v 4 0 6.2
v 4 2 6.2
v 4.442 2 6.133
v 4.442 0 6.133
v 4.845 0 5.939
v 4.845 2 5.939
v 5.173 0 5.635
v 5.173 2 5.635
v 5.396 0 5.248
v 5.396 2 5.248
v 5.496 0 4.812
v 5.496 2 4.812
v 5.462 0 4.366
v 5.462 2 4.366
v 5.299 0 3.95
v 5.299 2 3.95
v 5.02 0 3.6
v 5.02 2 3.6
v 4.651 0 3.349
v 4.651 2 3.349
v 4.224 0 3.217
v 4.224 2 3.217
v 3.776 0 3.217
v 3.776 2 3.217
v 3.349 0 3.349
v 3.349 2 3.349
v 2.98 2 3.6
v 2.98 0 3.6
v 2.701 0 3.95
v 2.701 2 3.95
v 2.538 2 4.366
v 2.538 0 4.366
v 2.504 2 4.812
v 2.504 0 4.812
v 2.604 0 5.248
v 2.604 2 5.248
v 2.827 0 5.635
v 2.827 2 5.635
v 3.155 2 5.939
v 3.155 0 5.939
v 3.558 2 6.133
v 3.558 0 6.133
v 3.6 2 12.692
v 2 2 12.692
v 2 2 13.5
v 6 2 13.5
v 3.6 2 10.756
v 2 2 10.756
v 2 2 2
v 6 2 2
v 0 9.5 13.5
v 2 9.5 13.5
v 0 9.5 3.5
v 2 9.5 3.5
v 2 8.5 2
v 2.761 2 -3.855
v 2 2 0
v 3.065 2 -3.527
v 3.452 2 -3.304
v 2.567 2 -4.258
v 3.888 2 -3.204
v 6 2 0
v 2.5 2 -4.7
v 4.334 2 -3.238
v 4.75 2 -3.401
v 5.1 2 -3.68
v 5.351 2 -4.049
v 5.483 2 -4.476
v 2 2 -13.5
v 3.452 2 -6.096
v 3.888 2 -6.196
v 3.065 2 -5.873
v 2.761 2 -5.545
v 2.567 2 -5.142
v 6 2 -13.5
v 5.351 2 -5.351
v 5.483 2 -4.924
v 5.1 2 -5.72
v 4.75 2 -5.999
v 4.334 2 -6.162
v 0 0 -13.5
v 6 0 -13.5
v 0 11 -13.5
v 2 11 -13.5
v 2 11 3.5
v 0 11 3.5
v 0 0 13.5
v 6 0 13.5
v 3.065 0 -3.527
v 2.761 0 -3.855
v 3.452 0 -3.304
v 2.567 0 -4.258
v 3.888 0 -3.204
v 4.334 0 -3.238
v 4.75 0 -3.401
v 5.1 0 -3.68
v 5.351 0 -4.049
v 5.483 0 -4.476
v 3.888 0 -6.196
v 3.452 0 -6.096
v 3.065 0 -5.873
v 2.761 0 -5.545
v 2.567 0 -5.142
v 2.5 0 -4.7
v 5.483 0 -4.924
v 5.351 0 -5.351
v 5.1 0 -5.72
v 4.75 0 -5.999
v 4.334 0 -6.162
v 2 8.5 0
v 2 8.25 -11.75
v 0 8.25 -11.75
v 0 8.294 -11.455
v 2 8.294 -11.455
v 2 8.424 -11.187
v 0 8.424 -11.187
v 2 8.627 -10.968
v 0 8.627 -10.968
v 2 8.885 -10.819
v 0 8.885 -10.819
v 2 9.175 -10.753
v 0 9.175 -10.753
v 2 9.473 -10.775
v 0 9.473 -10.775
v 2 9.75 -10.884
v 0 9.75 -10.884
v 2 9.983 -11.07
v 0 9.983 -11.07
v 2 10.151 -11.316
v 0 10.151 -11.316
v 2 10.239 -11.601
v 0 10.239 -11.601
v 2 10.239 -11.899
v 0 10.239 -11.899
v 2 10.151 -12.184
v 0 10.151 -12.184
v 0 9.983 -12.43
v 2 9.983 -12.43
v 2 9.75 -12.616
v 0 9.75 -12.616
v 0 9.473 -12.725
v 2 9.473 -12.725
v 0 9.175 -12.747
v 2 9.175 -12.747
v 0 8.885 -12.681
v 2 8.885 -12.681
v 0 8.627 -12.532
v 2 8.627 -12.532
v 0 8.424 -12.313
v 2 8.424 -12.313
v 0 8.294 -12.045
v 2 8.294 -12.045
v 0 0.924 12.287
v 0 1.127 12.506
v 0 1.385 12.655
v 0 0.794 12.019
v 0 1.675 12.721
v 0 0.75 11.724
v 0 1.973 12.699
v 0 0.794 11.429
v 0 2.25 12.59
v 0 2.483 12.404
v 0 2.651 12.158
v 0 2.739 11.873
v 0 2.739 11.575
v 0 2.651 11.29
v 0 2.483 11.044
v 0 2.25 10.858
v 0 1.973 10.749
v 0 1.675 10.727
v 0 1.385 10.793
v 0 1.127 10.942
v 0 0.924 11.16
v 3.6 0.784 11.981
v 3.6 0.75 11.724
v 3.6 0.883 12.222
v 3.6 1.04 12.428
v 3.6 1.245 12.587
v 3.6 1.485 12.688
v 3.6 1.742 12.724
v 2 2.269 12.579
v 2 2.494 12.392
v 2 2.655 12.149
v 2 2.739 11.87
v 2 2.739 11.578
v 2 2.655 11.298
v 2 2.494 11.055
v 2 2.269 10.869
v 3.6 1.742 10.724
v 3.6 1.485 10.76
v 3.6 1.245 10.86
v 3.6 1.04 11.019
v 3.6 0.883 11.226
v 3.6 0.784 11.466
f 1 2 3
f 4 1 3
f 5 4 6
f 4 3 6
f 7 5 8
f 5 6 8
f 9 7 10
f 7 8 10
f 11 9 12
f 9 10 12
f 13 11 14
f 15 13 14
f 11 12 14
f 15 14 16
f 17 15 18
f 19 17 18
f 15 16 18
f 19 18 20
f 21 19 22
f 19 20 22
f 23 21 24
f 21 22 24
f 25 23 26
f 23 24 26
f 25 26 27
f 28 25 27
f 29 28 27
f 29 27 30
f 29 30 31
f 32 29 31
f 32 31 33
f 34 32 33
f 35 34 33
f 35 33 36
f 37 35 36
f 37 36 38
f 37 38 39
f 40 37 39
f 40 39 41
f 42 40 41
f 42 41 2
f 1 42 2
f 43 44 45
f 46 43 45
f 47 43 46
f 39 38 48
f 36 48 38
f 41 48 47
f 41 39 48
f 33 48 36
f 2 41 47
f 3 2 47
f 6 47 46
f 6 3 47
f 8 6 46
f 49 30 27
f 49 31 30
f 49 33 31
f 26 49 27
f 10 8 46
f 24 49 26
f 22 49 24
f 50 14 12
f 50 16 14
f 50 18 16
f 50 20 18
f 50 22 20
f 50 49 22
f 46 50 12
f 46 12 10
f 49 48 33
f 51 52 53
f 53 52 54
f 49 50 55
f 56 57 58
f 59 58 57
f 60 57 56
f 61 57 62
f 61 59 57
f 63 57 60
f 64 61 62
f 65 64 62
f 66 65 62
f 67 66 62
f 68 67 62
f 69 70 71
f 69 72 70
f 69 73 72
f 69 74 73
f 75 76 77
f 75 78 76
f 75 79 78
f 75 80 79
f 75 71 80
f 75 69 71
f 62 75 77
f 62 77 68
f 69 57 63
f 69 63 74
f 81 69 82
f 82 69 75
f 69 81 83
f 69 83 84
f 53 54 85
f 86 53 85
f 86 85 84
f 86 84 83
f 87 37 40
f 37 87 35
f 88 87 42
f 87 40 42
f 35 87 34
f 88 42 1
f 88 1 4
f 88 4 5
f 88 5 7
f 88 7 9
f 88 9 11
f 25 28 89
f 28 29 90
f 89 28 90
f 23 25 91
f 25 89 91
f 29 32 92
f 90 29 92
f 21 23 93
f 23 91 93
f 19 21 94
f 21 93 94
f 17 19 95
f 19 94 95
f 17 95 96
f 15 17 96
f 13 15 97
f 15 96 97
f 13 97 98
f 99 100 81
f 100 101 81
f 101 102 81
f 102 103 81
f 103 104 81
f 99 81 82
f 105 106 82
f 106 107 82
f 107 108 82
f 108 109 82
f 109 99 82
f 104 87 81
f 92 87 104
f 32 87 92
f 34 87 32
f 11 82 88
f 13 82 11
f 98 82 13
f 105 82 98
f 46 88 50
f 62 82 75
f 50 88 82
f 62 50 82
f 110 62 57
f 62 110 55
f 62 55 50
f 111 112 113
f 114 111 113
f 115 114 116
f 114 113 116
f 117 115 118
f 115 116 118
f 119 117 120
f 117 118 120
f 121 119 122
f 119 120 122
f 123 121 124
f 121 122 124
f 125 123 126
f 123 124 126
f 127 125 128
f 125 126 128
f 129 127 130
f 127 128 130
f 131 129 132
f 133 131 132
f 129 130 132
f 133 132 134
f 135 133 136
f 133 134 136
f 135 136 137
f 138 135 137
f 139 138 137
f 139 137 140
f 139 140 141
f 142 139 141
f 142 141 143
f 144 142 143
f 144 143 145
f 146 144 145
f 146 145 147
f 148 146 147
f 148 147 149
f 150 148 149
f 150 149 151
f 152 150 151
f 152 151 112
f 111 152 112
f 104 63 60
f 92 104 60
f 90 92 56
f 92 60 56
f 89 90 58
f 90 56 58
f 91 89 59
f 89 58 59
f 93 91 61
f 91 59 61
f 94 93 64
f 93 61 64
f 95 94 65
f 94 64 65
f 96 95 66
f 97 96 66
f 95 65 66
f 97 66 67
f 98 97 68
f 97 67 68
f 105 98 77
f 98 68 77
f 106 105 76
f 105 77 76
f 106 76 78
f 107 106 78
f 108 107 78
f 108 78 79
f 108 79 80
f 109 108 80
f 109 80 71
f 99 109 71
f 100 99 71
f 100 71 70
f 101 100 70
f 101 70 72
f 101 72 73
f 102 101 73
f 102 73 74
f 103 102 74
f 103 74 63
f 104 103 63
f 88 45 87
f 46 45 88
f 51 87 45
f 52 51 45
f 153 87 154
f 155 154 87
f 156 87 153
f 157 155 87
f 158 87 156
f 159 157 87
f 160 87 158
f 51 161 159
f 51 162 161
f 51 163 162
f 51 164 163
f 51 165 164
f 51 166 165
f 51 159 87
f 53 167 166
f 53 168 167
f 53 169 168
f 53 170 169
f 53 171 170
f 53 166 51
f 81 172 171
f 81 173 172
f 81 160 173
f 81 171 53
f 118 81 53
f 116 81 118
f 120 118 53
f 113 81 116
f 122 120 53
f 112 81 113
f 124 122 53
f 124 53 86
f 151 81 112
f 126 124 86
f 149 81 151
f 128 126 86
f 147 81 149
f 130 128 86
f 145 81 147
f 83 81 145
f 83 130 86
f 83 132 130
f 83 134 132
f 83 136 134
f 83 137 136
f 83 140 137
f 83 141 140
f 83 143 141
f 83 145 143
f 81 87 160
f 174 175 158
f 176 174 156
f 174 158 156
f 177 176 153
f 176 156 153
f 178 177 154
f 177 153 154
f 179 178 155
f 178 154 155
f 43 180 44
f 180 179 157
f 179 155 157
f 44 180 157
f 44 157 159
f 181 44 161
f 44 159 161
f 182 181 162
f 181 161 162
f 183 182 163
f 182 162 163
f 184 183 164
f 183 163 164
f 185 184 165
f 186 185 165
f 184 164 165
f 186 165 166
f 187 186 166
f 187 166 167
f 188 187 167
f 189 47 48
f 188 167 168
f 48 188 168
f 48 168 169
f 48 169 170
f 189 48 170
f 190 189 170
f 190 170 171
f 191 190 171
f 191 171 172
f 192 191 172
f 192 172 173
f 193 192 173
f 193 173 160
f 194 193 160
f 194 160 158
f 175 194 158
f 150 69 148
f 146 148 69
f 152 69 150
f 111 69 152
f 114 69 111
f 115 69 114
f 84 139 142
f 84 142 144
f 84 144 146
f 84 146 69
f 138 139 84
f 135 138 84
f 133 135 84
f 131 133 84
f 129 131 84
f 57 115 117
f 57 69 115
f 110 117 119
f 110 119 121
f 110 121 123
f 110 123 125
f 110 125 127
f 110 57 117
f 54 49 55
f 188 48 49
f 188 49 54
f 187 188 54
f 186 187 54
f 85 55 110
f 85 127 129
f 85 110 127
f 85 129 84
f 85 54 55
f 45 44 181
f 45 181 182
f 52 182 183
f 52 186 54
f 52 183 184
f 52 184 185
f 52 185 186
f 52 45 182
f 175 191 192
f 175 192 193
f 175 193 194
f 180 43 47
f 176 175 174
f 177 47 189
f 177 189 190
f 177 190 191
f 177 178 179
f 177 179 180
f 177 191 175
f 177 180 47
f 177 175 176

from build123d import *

# Parameters (mm, degrees)
BOSS_EXTRUDE1_DEPTH = 13.5
SKETCH2_W           = 10
SKETCH2_H           = 1.5
CUT_EXTRUDE1_DEPTH  = 27
SKETCH3_R           = 1
CUT_EXTRUDE2_DEPTH  = 3.6
SKETCH4_W           = 6
SKETCH4_H           = 2
BOSS_EXTRUDE2_DEPTH = 3
SKETCH5_R           = 1.5
CUT_EXTRUDE3_DEPTH  = 9
BOSS_EXTRUDE3_DEPTH = 2
SKETCH8_W           = 6
SKETCH8_H           = 3
CUT_EXTRUDE4_DEPTH  = 10


with BuildPart() as part:
    # Sketch1 → Boss-Extrude1 (new, symmetric)
    with BuildSketch(Plane.XY):
        Polygon((0, 11), (0, 0), (6, 0), (6, 2), (2, 2), (2, 11), align=None)
    extrude(amount=BOSS_EXTRUDE1_DEPTH, both=True)

    # Sketch2 → Cut-Extrude1 (cut)
    with BuildSketch(Plane(origin=(2, 0, 0), x_dir=(0, 0, -1), z_dir=(1, 0, 0))):
        with Locations((-8.5, 10.25)):
            Rectangle(SKETCH2_W, SKETCH2_H)
    extrude(amount=-CUT_EXTRUDE1_DEPTH, mode=Mode.SUBTRACT)

    # Sketch3 → Cut-Extrude2 (cut)
    with BuildSketch(Plane.ZY):
        with Locations(Location((-11.75, 9.25, 0), (0, 0, 270))):
            Circle(SKETCH3_R)
        with Locations(Location((11.723777669, 1.75, 0), (0, 0, 270))):
            Circle(SKETCH3_R)
    extrude(amount=-CUT_EXTRUDE2_DEPTH, mode=Mode.SUBTRACT)

    # Sketch4 → Boss-Extrude2 (add)
    with BuildSketch(Plane.XY.offset(13.5)):
        with Locations((3, 1)):
            Rectangle(SKETCH4_W, SKETCH4_H)
    extrude(amount=BOSS_EXTRUDE2_DEPTH)

    # Sketch5 → Cut-Extrude3 (cut)
    with BuildSketch(Plane(origin=(0, 2, 0), x_dir=(1, 0, 0), z_dir=(0, 1, 0))):
        with Locations(Location((4, 4.7, 0), (0, 0, 180))):
            Circle(SKETCH5_R)
        with Locations(Location((4, -4.7, 0), (0, 0, 270))):
            Circle(SKETCH5_R)
    extrude(amount=-CUT_EXTRUDE3_DEPTH, mode=Mode.SUBTRACT)

    # Sketch7 → Boss-Extrude3 (add)
    with BuildSketch(Plane.XY):
        Polygon((2, 8.5), (6, 2), (2, 2), align=None)
    extrude(amount=BOSS_EXTRUDE3_DEPTH)

    # Sketch8 → Cut-Extrude4 (cut)
    with BuildSketch(Plane(origin=(0, 2, 0), x_dir=(1, 0, 0), z_dir=(0, 1, 0))):
        with Locations((3, -15)):
            Rectangle(SKETCH8_W, SKETCH8_H)
    extrude(amount=-CUT_EXTRUDE4_DEPTH, mode=Mode.SUBTRACT)


solid = part.part
